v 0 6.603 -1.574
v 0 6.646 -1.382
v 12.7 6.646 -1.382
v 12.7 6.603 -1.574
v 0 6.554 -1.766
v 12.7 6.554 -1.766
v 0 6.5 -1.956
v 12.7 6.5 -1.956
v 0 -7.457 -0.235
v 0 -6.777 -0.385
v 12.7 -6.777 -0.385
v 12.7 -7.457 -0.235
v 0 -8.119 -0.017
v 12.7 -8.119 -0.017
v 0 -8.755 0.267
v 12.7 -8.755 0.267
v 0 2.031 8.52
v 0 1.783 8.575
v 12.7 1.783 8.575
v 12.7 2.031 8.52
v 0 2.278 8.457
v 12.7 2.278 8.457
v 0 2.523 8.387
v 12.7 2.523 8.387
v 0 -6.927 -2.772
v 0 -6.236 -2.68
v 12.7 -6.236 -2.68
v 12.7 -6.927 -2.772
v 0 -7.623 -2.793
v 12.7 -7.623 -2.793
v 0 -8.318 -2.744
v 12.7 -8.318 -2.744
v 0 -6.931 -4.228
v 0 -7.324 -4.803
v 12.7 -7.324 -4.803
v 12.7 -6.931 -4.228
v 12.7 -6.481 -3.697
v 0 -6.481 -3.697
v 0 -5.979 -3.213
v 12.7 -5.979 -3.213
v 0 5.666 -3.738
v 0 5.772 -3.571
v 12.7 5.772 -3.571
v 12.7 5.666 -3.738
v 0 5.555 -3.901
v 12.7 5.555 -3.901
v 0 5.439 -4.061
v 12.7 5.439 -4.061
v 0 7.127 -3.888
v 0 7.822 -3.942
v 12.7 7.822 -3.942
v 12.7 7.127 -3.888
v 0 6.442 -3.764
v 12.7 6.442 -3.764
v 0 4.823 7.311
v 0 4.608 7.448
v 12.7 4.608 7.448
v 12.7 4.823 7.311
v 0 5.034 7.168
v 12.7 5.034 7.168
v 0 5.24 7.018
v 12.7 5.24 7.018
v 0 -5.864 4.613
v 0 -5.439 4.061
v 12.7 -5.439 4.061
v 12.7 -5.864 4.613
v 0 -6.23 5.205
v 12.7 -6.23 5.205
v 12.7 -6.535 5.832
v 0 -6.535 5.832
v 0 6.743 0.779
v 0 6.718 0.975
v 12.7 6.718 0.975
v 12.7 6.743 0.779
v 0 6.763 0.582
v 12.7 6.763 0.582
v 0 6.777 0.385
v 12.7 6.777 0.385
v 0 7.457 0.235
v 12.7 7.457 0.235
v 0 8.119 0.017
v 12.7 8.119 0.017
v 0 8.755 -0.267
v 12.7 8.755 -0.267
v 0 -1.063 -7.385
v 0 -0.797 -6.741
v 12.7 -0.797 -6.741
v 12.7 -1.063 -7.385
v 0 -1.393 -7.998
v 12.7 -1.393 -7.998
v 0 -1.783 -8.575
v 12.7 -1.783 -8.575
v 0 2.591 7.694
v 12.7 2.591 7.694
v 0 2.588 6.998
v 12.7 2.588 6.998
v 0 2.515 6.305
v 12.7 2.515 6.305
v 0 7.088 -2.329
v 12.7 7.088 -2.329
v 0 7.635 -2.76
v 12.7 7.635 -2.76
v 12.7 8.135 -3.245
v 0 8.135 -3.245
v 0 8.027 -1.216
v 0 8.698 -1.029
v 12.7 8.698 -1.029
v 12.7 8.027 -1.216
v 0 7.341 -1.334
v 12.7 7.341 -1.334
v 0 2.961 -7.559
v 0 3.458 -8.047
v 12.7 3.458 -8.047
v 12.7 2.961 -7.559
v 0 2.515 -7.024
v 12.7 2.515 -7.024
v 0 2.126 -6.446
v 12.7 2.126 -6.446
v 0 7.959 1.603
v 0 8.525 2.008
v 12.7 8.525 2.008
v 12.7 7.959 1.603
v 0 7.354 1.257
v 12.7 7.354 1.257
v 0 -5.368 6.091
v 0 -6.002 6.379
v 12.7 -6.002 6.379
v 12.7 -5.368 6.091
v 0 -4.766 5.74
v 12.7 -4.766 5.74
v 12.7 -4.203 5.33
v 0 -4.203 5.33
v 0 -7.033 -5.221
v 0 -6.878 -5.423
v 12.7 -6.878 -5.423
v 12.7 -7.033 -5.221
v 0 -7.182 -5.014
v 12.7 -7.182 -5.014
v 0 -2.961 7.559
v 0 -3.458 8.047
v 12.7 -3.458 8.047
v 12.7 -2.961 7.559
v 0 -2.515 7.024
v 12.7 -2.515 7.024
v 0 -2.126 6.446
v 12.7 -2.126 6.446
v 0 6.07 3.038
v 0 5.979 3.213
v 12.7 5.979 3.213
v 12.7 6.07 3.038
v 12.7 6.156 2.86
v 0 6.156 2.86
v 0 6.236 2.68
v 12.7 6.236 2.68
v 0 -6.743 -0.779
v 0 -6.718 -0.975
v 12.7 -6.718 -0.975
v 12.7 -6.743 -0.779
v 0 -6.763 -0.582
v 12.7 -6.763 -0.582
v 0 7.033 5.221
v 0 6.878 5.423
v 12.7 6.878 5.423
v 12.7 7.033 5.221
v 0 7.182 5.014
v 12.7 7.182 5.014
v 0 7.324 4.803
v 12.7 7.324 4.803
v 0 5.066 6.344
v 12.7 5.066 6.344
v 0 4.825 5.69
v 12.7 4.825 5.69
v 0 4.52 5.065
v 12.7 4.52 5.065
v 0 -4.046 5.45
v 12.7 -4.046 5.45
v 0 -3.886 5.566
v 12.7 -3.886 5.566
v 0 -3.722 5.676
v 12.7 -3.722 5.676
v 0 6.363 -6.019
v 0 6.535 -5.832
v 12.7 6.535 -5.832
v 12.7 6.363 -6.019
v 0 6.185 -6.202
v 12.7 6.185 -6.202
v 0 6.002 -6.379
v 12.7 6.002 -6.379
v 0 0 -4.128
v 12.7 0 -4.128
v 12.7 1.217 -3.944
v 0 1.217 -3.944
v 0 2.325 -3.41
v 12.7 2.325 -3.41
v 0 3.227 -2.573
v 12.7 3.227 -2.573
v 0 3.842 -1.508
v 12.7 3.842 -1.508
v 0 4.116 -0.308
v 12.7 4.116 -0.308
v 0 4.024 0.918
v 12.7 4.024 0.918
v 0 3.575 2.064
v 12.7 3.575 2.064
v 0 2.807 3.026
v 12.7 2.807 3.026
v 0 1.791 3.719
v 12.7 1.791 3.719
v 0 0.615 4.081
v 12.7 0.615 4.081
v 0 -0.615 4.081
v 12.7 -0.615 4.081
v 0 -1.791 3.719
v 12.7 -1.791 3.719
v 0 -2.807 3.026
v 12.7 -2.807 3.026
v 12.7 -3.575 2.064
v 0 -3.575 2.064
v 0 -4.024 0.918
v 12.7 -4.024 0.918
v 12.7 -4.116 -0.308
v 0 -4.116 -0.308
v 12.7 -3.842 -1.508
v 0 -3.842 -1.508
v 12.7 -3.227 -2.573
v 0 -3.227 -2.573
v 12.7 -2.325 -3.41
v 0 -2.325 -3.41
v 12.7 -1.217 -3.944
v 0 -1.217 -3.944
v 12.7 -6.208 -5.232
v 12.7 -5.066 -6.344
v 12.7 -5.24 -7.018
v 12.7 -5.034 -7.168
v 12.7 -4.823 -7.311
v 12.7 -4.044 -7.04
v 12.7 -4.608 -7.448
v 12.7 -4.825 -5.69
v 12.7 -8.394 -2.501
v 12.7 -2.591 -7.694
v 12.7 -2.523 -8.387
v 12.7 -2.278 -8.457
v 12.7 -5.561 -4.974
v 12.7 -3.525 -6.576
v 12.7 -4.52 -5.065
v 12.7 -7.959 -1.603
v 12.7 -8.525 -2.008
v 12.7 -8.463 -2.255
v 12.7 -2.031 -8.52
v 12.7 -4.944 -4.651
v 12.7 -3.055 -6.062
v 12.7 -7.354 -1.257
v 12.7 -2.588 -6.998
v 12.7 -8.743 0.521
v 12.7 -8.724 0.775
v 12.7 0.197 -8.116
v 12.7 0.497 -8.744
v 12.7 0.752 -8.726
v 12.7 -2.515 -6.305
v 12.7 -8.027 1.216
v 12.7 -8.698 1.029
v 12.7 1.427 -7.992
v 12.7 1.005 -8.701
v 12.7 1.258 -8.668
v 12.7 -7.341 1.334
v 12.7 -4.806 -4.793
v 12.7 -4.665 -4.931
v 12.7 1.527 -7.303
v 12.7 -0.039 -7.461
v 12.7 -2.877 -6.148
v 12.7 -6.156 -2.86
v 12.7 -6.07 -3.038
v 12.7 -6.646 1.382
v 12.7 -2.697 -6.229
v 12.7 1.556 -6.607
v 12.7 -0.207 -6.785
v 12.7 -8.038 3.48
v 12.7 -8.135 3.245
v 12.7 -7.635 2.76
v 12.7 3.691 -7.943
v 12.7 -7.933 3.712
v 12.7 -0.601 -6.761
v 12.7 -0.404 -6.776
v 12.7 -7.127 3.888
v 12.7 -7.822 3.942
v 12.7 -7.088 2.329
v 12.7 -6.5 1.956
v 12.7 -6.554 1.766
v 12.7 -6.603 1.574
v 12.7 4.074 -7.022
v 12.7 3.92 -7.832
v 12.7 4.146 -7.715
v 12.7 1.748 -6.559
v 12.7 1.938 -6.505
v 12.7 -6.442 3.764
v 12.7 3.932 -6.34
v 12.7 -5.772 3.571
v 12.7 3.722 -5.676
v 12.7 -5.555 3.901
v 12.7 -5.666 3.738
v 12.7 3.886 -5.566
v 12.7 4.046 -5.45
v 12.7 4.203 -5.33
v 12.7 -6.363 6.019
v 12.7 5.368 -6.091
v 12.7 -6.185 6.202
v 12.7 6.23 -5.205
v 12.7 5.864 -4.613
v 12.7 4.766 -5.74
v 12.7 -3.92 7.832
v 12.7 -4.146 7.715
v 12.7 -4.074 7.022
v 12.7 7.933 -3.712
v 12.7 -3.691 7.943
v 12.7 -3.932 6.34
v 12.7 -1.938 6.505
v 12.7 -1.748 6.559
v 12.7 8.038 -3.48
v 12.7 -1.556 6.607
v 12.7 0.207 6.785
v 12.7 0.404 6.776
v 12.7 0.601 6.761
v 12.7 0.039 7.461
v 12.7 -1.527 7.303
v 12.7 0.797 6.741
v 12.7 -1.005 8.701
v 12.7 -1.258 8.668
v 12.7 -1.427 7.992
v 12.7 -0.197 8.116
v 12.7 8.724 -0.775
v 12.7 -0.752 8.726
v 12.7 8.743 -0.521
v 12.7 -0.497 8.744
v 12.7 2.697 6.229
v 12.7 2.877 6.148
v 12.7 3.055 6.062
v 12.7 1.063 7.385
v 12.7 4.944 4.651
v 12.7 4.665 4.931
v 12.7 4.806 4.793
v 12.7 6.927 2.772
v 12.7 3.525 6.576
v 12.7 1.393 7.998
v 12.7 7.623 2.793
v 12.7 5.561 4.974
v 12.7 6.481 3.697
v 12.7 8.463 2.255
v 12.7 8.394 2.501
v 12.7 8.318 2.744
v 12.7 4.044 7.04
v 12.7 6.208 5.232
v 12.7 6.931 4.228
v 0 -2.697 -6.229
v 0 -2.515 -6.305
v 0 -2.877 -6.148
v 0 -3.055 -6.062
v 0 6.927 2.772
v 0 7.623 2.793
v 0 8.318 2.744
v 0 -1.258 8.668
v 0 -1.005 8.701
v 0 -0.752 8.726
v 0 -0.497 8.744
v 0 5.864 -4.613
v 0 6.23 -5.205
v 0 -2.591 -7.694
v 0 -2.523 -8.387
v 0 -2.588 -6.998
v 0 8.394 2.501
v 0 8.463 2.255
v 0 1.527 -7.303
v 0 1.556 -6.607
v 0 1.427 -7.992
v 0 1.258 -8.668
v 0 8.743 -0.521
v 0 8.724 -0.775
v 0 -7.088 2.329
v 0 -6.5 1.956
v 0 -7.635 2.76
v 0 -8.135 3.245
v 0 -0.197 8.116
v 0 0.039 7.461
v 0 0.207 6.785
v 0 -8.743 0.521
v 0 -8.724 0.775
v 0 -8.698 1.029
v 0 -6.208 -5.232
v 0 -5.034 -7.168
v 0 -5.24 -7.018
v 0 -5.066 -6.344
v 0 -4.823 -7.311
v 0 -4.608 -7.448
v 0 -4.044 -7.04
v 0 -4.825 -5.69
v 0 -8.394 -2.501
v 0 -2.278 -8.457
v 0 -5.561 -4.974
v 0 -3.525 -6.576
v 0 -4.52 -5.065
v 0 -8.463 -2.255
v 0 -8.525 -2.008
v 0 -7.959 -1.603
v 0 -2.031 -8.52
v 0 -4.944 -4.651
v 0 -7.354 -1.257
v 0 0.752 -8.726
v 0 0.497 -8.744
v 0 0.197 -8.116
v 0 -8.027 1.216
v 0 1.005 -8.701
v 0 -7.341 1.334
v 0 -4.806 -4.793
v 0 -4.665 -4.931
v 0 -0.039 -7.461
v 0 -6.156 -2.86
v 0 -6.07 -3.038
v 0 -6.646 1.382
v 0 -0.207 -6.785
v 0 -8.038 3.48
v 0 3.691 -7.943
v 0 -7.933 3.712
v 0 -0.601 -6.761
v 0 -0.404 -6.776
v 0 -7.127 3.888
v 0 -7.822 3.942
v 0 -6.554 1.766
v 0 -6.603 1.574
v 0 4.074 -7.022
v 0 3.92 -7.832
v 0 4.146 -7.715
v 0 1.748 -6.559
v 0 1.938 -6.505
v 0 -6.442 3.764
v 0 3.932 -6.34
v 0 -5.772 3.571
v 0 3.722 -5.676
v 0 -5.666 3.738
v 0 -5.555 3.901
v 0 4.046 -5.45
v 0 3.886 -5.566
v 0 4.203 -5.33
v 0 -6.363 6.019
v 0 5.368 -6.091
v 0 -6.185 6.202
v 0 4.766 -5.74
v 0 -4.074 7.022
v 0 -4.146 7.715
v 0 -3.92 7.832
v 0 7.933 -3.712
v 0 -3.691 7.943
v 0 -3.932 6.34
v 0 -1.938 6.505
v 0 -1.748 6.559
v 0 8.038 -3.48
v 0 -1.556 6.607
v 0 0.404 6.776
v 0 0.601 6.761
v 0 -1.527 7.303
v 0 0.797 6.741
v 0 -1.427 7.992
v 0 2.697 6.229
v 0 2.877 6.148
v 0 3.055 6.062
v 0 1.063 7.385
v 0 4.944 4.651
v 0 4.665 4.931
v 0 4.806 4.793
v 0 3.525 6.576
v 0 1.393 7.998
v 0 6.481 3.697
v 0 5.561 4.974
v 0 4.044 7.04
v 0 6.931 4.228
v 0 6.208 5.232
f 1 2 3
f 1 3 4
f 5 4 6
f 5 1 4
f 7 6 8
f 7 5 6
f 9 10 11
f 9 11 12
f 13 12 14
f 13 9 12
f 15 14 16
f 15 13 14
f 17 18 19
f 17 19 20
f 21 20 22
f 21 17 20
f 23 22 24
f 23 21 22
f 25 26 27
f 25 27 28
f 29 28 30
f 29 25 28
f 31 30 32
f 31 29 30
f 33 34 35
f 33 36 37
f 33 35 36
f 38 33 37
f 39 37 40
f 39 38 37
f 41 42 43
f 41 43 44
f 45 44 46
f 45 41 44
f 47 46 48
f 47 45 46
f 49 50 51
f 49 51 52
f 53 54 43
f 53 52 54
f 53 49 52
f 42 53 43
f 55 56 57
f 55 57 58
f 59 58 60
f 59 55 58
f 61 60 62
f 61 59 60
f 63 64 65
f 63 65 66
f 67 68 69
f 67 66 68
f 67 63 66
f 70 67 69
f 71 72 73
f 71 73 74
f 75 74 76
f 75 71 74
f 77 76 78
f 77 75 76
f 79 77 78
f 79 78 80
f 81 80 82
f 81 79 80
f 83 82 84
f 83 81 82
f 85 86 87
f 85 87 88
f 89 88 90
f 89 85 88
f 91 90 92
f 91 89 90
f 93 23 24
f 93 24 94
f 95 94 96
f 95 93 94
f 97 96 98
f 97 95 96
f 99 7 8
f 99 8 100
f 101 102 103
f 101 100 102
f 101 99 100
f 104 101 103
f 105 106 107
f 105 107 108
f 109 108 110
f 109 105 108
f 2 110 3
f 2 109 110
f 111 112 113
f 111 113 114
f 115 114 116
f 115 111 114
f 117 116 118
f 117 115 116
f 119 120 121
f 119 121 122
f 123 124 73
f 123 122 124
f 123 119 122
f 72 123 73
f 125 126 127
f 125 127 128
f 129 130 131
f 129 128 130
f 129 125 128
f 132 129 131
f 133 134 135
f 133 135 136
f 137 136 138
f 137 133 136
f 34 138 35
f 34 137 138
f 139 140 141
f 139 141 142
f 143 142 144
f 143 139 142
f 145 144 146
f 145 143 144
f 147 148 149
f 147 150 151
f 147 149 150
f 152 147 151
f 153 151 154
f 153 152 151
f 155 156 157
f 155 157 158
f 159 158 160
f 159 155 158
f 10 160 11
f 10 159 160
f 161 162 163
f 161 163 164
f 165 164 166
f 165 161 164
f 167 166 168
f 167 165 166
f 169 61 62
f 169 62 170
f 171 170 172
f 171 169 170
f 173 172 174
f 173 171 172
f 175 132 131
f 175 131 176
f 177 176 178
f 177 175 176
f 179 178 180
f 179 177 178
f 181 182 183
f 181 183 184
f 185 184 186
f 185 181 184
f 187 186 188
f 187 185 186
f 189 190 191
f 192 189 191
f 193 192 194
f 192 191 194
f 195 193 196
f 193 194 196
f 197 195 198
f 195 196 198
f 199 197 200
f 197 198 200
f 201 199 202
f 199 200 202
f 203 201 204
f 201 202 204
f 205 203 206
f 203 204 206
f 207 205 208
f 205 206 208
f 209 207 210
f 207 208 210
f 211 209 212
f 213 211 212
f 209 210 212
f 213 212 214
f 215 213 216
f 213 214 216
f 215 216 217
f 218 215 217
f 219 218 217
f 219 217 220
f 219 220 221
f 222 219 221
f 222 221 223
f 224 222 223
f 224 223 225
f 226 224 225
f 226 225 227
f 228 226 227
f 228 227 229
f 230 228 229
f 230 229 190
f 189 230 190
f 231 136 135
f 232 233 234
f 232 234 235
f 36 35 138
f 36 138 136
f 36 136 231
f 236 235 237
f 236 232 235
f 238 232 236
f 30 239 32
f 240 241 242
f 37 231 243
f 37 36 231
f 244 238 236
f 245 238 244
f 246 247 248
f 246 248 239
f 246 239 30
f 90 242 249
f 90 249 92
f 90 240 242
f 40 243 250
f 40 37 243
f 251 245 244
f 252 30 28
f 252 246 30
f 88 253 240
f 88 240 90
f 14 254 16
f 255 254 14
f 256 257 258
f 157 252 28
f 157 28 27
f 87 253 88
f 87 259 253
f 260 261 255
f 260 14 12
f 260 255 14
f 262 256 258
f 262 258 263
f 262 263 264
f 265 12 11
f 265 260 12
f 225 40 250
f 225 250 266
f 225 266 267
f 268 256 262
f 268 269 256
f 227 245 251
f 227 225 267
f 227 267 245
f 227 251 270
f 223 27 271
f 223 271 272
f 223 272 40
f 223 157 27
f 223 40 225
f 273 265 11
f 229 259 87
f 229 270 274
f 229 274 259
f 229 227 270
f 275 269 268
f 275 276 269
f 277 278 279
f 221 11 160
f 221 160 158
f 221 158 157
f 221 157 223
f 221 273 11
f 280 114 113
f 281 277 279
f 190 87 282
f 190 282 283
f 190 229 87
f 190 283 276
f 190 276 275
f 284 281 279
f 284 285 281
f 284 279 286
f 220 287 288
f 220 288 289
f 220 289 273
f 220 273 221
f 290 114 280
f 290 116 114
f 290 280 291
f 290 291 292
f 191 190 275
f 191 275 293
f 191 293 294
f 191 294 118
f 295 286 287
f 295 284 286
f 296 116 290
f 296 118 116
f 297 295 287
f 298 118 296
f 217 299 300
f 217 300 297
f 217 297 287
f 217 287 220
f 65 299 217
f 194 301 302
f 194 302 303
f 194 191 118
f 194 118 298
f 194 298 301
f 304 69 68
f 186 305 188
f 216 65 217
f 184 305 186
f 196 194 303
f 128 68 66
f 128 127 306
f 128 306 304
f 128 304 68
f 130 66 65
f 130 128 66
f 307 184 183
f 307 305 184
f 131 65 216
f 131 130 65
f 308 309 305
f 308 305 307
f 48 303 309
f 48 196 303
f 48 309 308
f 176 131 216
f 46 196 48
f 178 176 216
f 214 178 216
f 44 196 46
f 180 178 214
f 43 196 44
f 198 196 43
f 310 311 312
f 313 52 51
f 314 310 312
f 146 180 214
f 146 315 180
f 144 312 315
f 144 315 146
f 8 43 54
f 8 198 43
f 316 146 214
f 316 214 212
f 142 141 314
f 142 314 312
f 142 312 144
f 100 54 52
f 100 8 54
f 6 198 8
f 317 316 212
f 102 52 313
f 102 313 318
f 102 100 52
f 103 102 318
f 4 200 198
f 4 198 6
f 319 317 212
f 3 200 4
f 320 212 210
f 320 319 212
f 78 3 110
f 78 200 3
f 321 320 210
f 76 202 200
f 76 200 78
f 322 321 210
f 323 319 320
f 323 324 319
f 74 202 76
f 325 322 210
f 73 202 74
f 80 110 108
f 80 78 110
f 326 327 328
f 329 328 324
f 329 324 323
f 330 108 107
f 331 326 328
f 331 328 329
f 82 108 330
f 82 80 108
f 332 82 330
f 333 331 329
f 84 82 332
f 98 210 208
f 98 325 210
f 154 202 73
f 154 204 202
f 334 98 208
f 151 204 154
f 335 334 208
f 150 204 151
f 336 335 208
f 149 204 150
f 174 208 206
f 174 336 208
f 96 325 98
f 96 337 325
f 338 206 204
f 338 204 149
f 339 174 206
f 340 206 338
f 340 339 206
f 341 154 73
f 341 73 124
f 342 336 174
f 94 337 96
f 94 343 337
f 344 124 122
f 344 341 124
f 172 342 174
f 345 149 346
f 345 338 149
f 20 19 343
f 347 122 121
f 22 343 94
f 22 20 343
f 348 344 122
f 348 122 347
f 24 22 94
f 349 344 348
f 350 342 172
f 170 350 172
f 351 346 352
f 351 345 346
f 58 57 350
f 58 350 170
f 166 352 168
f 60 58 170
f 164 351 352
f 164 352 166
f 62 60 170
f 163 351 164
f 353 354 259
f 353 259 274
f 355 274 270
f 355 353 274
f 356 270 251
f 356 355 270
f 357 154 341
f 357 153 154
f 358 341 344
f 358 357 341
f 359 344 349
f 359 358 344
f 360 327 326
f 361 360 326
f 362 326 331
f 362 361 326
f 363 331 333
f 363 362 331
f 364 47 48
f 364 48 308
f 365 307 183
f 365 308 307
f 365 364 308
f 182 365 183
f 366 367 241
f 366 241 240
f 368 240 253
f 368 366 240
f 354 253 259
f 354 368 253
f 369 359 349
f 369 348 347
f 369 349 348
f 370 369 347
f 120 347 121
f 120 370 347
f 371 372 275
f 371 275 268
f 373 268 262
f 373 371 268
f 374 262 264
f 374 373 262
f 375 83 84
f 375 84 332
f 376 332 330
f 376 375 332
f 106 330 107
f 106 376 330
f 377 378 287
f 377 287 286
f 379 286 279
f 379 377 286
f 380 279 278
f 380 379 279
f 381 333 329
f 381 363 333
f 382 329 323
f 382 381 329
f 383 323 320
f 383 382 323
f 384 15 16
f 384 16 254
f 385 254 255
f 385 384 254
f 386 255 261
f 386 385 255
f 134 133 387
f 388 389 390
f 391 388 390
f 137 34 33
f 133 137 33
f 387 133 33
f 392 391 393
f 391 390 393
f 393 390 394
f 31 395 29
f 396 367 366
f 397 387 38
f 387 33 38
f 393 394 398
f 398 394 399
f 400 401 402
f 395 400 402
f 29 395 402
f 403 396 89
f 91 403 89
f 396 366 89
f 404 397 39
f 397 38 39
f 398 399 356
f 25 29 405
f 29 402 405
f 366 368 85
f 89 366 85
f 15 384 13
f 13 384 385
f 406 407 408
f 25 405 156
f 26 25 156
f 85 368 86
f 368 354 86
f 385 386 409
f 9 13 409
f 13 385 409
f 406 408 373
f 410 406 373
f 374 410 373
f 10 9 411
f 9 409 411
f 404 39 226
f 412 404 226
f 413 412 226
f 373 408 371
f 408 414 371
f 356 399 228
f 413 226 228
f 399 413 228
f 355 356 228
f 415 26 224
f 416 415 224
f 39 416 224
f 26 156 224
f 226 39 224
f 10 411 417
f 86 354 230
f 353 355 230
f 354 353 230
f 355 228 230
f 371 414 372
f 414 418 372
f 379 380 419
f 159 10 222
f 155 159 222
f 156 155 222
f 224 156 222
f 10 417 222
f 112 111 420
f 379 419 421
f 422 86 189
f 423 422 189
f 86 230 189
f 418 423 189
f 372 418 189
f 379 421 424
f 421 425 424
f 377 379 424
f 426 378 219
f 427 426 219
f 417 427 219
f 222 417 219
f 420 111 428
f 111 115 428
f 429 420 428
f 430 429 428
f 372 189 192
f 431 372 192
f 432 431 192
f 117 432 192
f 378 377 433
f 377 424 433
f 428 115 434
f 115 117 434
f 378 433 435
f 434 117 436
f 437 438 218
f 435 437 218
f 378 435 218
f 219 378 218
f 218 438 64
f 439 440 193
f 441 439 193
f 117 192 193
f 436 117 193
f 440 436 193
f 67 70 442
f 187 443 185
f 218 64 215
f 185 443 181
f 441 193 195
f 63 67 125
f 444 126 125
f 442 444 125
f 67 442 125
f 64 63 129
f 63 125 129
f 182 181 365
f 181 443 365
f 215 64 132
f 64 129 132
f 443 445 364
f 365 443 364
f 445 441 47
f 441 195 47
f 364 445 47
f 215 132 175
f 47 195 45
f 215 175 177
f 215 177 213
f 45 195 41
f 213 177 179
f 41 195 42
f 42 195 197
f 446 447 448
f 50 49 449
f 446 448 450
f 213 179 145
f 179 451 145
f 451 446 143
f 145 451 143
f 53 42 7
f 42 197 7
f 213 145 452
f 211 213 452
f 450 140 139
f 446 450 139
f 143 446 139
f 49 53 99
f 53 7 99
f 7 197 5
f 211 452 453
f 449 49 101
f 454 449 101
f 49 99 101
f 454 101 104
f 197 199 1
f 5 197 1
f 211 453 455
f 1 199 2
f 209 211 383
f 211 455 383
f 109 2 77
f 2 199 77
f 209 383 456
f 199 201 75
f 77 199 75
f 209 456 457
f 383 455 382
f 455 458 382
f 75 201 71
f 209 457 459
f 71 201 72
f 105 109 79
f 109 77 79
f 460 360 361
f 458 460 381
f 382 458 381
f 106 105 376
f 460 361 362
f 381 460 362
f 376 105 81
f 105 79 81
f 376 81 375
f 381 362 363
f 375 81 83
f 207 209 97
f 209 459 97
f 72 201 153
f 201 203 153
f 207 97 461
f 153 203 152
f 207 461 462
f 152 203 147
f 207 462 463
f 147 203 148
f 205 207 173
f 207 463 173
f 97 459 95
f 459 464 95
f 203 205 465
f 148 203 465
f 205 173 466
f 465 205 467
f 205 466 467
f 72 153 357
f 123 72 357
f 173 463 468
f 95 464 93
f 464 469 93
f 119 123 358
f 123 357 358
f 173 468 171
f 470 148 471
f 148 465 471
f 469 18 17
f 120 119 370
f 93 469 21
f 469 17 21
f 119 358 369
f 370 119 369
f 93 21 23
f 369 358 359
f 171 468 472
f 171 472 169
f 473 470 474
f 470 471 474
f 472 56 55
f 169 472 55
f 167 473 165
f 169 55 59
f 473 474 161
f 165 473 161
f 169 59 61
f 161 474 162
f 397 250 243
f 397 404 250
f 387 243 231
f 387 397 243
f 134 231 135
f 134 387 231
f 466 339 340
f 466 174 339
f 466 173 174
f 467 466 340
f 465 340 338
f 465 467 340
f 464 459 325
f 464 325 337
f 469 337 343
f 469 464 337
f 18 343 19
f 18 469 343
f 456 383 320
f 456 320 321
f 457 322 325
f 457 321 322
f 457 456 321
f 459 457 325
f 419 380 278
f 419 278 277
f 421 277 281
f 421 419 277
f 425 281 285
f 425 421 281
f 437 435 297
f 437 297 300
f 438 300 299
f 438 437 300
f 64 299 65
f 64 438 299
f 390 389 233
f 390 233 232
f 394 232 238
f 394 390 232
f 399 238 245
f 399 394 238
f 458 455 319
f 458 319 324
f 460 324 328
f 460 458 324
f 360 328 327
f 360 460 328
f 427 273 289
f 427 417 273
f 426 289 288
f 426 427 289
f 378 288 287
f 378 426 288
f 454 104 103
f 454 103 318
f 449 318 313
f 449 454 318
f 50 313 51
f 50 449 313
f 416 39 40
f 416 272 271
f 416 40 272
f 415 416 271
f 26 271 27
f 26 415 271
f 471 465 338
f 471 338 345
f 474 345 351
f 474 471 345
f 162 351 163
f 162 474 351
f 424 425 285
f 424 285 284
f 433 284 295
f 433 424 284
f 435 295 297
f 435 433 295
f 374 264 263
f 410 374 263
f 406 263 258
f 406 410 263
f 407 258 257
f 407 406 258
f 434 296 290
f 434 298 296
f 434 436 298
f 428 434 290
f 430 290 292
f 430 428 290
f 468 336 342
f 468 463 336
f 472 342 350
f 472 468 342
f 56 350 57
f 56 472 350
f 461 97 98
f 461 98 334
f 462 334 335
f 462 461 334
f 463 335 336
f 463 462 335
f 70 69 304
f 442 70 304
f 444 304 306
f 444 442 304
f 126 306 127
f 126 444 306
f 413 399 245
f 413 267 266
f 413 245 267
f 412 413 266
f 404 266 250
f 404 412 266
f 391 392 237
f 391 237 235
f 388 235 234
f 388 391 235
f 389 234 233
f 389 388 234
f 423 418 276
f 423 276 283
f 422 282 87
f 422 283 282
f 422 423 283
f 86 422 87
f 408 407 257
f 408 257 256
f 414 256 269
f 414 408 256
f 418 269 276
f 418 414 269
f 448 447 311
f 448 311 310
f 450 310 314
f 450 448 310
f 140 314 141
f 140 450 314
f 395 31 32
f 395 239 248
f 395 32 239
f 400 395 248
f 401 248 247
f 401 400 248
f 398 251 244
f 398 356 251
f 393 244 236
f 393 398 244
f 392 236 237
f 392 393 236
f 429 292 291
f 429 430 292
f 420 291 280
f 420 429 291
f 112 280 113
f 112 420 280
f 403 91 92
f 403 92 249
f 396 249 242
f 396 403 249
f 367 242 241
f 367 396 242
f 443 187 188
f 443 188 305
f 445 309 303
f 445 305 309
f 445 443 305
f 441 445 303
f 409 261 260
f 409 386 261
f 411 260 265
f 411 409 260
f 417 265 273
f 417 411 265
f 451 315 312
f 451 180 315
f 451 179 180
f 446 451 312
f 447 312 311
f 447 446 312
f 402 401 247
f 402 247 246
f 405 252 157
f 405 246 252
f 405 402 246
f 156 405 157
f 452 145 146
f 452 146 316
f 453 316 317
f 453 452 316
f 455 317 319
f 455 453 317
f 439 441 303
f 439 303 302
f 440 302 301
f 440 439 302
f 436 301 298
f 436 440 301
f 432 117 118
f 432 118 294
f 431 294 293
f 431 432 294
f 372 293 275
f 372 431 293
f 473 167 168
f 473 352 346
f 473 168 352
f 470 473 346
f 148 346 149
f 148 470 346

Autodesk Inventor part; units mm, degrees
ref_plane "YZ Plane" through (0, 0, 0) normal (1, 0, 0) x (0, 1, 0)
ref_plane "XZ Plane" through (0, 0, 0) normal (0, 1, 0) x (-1, 0, 0)
ref_plane "XY Plane" through (0, 0, 0) normal (0, 0, 1) x (1, 0, 0)
sketch "Sketch1" plane through (0, 0, 0) normal (1, 0, 0) x (0, 1, 0)
  arc A0 (0.2067, 6.7848) -> (-0.4974, 8.7445) centre (-6.534, 5.4695) ccw
  arc A1 (-0.4974, 8.7445) -> (-1.2576, 8.6679) centre (0, 0) ccw
  arc A2 (-1.2576, 8.6679) -> (-1.5564, 6.6071) centre (5.3112, 6.6633) ccw
  arc A3 (-1.5564, 6.6071) -> (-2.1263, 6.4463) centre (0, 0) ccw
  arc A4 (-2.1263, 6.4463) -> (-3.4581, 8.047) centre (-8.0107, 2.9049) ccw
  arc A5 (-3.4581, 8.047) -> (-4.1463, 7.715) centre (0, 0) ccw
  arc A6 (-4.1463, 7.715) -> (-3.7223, 5.6763) centre (2.7119, 8.078) ccw
  arc A7 (-3.7223, 5.6763) -> (-4.2029, 5.3303) centre (0, 0) ccw
  arc A8 (-4.2029, 5.3303) -> (-6.0018, 6.379) centre (-8.5211, -0.0101) ccw
  arc A9 (-6.0018, 6.379) -> (-6.535, 5.8316) centre (0, 0) ccw
  arc A10 (-6.535, 5.8316) -> (-5.4392, 4.0609) centre (-0.2145, 8.5184) ccw
  arc A11 (-5.4392, 4.0609) -> (-5.7725, 3.5714) centre (0, 0) ccw
  arc A12 (-5.7725, 3.5714) -> (-7.8216, 3.9415) centre (-8.0037, -2.9239) ccw
  arc A13 (-7.8216, 3.9415) -> (-8.1354, 3.2448) centre (0, 0) ccw
  arc A14 (-8.1354, 3.2448) -> (-6.5001, 1.9557) centre (-3.115, 7.9313) ccw
  arc A15 (-6.5001, 1.9557) -> (-6.6458, 1.3817) centre (0, 0) ccw
  arc A16 (-6.6458, 1.3817) -> (-8.698, 1.0287) centre (-6.521, -5.485) ccw
  arc A17 (-8.698, 1.0287) -> (-8.7546, 0.2667) centre (0, 0) ccw
  arc A18 (-8.7546, 0.2667) -> (-6.777, -0.3854) centre (-5.6398, 6.3876) ccw
  arc A19 (-6.777, -0.3854) -> (-6.7176, -0.9746) centre (0, 0) ccw
  arc A20 (-6.7176, -0.9746) -> (-8.5253, -2.0083) centre (-4.2518, -7.3845) ccw
  arc A21 (-8.5253, -2.0083) -> (-8.3178, -2.7436) centre (0, 0) ccw
  arc A22 (-8.3178, -2.7436) -> (-6.2364, -2.6801) centre (-7.4844, 4.0734) ccw
  arc A23 (-6.2364, -2.6801) -> (-5.9791, -3.2134) centre (0, 0) ccw
  arc A24 (-5.9791, -3.2134) -> (-7.3243, -4.803) centre (-1.4697, -8.3934) ccw
  arc A25 (-7.3243, -4.803) -> (-6.8778, -5.423) centre (0, 0) ccw
  arc A26 (-6.8778, -5.423) -> (-4.9437, -4.6514) centre (-8.4262, 1.268) ccw
  arc A27 (-4.9437, -4.6514) -> (-4.5195, -5.0646) centre (0, 0) ccw
  arc A28 (-4.5195, -5.0646) -> (-5.2399, -7.0184) centre (1.4896, -8.3899) ccw
  arc A29 (-5.2399, -7.0184) -> (-4.6082, -7.4483) centre (0, 0) ccw
  arc A30 (-4.6082, -7.4483) -> (-3.0547, -6.0618) centre (-8.3517, -1.6904) ccw
  arc A31 (-3.0547, -6.0618) -> (-2.5147, -6.3049) centre (0, 0) ccw
  arc A32 (-2.5147, -6.3049) -> (-2.5234, -8.3872) centre (4.2693, -7.3744) ccw
  arc A33 (-2.5234, -8.3872) -> (-1.7828, -8.5753) centre (0, 0) ccw
  arc A34 (-1.7828, -8.5753) -> (-0.7972, -6.741) centre (-7.2699, -4.445) ccw
  arc A35 (-0.7972, -6.741) -> (-0.2067, -6.7848) centre (0, 0) ccw
  arc A36 (-0.2067, -6.7848) -> (0.4974, -8.7445) centre (6.534, -5.4695) ccw
  arc A37 (0.4974, -8.7445) -> (1.2576, -8.6679) centre (0, 0) ccw
  arc A38 (1.2576, -8.6679) -> (1.5564, -6.6071) centre (-5.3112, -6.6633) ccw
  arc A39 (1.5564, -6.6071) -> (2.1263, -6.4463) centre (0, 0) ccw
  arc A40 (2.1263, -6.4463) -> (3.4581, -8.047) centre (8.0107, -2.9049) ccw
  arc A41 (3.4581, -8.047) -> (4.1463, -7.715) centre (0, 0) ccw
  arc A42 (4.1463, -7.715) -> (3.7223, -5.6763) centre (-2.7119, -8.078) ccw
  arc A43 (3.7223, -5.6763) -> (4.2029, -5.3303) centre (0, 0) ccw
  arc A44 (4.2029, -5.3303) -> (6.0018, -6.379) centre (8.5211, 0.0101) ccw
  arc A45 (6.0018, -6.379) -> (6.535, -5.8316) centre (0, 0) ccw
  arc A46 (6.535, -5.8316) -> (5.4392, -4.0609) centre (0.2145, -8.5184) ccw
  arc A47 (5.4392, -4.0609) -> (5.7725, -3.5714) centre (0, 0) ccw
  arc A48 (5.7725, -3.5714) -> (7.8216, -3.9415) centre (8.0037, 2.9239) ccw
  arc A49 (7.8216, -3.9415) -> (8.1354, -3.2448) centre (0, 0) ccw
  arc A50 (8.1354, -3.2448) -> (6.5001, -1.9557) centre (3.115, -7.9313) ccw
  arc A51 (6.5001, -1.9557) -> (6.6458, -1.3817) centre (0, 0) ccw
  arc A52 (6.6458, -1.3817) -> (8.698, -1.0287) centre (6.521, 5.485) ccw
  arc A53 (8.698, -1.0287) -> (8.7546, -0.2667) centre (0, 0) ccw
  arc A54 (8.7546, -0.2667) -> (6.777, 0.3854) centre (5.6398, -6.3876) ccw
  arc A55 (6.777, 0.3854) -> (6.7176, 0.9746) centre (0, 0) ccw
  arc A56 (6.7176, 0.9746) -> (8.5253, 2.0083) centre (4.2518, 7.3845) ccw
  arc A57 (8.5253, 2.0083) -> (8.3178, 2.7436) centre (0, 0) ccw
  arc A58 (8.3178, 2.7436) -> (6.2364, 2.6801) centre (7.4844, -4.0734) ccw
  arc A59 (6.2364, 2.6801) -> (5.9791, 3.2134) centre (0, 0) ccw
  arc A60 (5.9791, 3.2134) -> (7.3243, 4.803) centre (1.4697, 8.3934) ccw
  arc A61 (7.3243, 4.803) -> (6.8778, 5.423) centre (0, 0) ccw
  arc A62 (6.8778, 5.423) -> (4.9437, 4.6514) centre (8.4262, -1.268) ccw
  arc A63 (4.9437, 4.6514) -> (4.5195, 5.0646) centre (0, 0) ccw
  arc A64 (4.5195, 5.0646) -> (5.2399, 7.0184) centre (-1.4896, 8.3899) ccw
  arc A65 (5.2399, 7.0184) -> (4.6082, 7.4483) centre (0, 0) ccw
  arc A66 (4.6082, 7.4483) -> (3.0547, 6.0618) centre (8.3517, 1.6904) ccw
  arc A67 (3.0547, 6.0618) -> (2.5147, 6.3049) centre (0, 0) ccw
  arc A68 (2.5147, 6.3049) -> (2.5234, 8.3872) centre (-4.2693, 7.3744) ccw
  arc A69 (2.5234, 8.3872) -> (1.7828, 8.5753) centre (0, 0) ccw
  arc A70 (1.7828, 8.5753) -> (0.7972, 6.741) centre (7.2699, 4.445) ccw
  arc A71 (0.7972, 6.741) -> (0.2067, 6.7848) centre (0, 0) ccw
  point P0 (0, 0)
extrude "Extrusion1" add sketch "Sketch1" along normal blind 12.7
sketch "Sketch2" plane through (12.7, 0, 0) normal (1, 0, 0) x (0, 0, -1)
  arc A0 (-6.741, 0.7972) -> (-6.7848, 0.2067) centre (0, 0) ccw projected
  circle A1 centre (0, 0) radius 4.1275
  dimension "d2" = 8.255
extrude "Extrusion2" cut sketch "Sketch2" against normal through all
properties part number "Gear"
